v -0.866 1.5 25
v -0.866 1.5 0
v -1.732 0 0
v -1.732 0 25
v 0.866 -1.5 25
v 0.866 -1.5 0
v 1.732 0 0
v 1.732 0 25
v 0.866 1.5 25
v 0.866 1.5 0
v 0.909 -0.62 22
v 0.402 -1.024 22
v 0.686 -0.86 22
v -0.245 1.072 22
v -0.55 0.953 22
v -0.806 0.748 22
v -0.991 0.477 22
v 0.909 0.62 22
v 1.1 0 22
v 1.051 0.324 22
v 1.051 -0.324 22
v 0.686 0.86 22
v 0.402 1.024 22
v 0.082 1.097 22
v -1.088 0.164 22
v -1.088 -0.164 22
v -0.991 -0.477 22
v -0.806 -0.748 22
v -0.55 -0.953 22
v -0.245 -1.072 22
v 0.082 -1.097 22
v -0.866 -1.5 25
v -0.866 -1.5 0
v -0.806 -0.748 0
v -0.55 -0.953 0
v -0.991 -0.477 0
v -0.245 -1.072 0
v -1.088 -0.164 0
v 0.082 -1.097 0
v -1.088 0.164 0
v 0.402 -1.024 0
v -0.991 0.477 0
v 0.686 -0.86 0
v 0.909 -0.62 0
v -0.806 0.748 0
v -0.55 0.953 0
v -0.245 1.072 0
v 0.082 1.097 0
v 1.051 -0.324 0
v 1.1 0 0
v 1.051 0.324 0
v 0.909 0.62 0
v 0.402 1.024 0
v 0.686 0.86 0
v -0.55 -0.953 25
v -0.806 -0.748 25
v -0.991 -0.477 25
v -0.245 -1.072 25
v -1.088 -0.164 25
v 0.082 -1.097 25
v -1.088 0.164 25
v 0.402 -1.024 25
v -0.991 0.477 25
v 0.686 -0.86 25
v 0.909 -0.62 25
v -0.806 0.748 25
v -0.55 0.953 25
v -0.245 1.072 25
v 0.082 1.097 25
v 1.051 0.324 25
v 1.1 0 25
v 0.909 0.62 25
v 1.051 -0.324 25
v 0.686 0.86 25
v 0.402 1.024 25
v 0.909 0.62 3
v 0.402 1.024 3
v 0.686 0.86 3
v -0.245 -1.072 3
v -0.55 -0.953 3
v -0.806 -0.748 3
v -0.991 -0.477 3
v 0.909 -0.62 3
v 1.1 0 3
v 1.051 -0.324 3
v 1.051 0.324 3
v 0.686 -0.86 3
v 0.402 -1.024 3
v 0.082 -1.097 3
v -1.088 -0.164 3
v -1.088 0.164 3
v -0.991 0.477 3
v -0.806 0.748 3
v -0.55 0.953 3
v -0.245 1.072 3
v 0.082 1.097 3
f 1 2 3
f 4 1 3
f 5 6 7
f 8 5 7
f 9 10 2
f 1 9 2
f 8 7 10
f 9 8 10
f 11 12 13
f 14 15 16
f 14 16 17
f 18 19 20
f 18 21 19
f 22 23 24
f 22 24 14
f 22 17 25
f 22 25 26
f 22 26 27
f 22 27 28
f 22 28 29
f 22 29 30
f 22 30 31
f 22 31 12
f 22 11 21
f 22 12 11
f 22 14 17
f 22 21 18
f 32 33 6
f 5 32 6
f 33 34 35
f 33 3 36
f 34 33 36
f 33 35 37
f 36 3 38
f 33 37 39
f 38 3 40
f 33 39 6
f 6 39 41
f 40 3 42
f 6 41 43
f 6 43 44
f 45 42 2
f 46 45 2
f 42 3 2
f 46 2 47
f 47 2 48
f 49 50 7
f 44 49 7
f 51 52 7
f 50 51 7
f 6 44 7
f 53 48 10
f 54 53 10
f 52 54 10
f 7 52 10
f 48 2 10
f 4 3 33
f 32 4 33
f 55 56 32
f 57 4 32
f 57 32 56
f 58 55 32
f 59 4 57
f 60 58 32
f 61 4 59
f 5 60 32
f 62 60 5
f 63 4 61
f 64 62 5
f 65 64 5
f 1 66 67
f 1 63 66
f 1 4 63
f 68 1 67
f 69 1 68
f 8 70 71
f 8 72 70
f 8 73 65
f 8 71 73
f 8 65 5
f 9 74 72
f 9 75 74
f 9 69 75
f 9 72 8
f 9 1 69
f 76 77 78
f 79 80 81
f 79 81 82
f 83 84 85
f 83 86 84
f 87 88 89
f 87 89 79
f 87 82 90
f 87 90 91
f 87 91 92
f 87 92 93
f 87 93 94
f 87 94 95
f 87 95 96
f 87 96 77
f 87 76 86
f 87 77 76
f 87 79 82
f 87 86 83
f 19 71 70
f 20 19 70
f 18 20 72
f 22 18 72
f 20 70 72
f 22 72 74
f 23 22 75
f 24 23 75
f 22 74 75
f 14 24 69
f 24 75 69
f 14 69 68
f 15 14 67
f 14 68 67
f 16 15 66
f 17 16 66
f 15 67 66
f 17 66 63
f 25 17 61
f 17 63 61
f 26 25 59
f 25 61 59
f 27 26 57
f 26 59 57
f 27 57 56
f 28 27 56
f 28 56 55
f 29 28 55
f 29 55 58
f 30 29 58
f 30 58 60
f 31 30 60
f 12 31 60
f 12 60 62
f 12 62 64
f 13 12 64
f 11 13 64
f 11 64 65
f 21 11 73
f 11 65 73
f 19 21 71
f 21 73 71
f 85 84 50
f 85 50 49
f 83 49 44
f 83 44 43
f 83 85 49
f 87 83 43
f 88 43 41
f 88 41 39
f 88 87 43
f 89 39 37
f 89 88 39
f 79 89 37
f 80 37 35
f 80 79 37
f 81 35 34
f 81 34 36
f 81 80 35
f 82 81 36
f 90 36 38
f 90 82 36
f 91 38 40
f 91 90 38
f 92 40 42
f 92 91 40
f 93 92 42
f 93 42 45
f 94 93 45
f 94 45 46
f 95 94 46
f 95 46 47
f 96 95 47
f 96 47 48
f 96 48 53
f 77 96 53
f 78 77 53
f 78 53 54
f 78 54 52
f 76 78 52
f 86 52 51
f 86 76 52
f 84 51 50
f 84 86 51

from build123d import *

# Parameters (mm, degrees)
EXTRUDE_1_DEPTH     = 25
SKETCH_2_R          = 1.1
CUT_EXTRUDE_1_DEPTH = 3
CUT_EXTRUDE_START   = -3
SKETCH_3_R          = 1.1
CUT_EXTRUDE_2_DEPTH = 3


with BuildPart() as part:
    # 草图1 → 凸台-拉伸1 (new body)
    with BuildSketch(Plane.XY):
        Polygon((1.732050808, 0), (0.866025404, 1.5), (-0.866025404, 1.5), (-1.732050808, 0), (-0.866025404, -1.5), (0.866025404, -1.5), align=None)
    extrude(amount=EXTRUDE_1_DEPTH)

    # 草图2 → 切除-拉伸1 (cut)
    with BuildSketch(Plane.XY.offset(25)):
        Circle(SKETCH_2_R)
    extrude(amount=-CUT_EXTRUDE_1_DEPTH, mode=Mode.SUBTRACT)

    # 草图3 → 切除-拉伸2 (cut)
    with BuildSketch(Plane(origin=(0, 0, 0), x_dir=(-1, 0, 0), z_dir=(0, 0, -1)).offset(CUT_EXTRUDE_START)):
        with Locations(Location((0, 0, 0), (0, 0, 180))):
            Circle(SKETCH_3_R)
    extrude(amount=CUT_EXTRUDE_2_DEPTH, mode=Mode.SUBTRACT)


solid = part.part
